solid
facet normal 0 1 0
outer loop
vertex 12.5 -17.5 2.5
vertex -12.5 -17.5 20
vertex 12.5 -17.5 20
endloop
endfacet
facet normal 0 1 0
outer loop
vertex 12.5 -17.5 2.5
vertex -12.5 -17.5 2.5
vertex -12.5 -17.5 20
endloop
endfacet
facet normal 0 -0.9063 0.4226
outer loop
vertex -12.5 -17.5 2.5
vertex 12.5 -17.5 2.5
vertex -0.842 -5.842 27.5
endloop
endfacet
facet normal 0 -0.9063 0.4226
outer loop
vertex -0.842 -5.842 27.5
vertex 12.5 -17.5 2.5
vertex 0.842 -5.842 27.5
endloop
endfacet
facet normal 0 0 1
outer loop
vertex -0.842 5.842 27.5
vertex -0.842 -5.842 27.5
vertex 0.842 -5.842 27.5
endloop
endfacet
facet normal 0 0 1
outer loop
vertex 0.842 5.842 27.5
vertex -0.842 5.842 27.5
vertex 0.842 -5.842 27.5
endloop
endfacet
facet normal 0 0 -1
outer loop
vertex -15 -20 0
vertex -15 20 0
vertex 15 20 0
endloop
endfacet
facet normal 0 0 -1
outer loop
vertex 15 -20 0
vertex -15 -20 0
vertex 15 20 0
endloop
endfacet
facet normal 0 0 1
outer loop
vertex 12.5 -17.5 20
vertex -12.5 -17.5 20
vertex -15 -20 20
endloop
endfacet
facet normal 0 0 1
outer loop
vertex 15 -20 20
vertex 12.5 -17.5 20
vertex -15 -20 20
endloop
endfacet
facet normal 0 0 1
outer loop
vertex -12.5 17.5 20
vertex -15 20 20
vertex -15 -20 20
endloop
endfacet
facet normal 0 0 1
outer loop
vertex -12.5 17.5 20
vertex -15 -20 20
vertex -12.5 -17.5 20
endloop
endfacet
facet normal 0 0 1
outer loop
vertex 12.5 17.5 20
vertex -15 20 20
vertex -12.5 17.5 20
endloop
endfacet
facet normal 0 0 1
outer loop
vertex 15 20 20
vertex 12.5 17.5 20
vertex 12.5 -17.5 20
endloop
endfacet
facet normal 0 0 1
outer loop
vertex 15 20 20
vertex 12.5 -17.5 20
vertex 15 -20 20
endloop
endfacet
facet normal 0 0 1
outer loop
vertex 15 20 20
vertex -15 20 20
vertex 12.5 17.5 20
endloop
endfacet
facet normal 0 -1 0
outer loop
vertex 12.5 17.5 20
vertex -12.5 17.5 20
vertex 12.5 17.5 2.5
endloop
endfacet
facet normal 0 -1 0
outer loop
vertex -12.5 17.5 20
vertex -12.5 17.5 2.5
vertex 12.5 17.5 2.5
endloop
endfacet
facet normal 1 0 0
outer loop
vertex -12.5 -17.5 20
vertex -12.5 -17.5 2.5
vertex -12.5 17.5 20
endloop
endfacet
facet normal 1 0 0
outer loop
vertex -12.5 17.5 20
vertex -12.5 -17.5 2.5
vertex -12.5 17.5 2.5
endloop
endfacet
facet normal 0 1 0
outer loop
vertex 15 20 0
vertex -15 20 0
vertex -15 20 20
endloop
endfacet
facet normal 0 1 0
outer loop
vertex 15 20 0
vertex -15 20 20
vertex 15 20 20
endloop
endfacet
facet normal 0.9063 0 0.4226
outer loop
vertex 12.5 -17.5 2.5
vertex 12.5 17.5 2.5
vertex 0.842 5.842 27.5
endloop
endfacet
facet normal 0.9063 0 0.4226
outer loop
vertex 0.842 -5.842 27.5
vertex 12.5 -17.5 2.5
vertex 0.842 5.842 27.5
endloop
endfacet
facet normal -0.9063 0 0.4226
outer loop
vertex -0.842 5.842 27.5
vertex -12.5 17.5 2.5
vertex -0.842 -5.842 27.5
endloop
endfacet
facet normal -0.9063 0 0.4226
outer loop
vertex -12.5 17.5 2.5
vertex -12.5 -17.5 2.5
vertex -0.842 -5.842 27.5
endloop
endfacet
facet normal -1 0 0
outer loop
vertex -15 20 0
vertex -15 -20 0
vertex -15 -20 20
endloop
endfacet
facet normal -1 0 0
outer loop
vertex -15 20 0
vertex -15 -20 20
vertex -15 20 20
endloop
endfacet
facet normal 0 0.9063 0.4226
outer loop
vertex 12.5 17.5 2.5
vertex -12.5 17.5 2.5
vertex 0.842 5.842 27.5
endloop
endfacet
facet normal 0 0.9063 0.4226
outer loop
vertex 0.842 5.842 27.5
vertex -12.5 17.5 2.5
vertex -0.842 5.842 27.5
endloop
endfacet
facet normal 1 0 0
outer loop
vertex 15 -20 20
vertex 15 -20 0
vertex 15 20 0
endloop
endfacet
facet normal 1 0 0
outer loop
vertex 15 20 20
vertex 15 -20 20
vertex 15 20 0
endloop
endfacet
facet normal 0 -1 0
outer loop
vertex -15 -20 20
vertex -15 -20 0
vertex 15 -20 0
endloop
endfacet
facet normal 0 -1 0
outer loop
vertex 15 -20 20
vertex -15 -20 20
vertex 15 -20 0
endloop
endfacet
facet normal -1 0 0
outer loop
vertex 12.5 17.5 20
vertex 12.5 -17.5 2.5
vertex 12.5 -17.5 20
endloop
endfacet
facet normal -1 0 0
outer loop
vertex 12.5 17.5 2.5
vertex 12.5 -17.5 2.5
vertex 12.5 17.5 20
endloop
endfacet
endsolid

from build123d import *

# Parameters (mm, degrees)
F0_W     = 30
F0_H     = 40
F1_DEPTH = 20
F2_T     = -2.5
F3_W     = 25
F3_H     = 35
F4_DEPTH = 25
F4_TAPER = 25


with BuildPart() as f1:
    # F0 (on Top) → F1 (new body)
    with BuildSketch(Plane.XY):
        Rectangle(F0_W, F0_H)
    extrude(amount=F1_DEPTH)

    # F2
    f2_openings = [f1.faces().sort_by_distance(p)[0] for p in [
        (0, 0, 20),
    ]]
    offset(amount=F2_T, openings=f2_openings)

    # F3 (on face) → F4 (join)
    with BuildSketch(Plane.XY.offset(2.5)):
        Rectangle(F3_W, F3_H)
    extrude(amount=F4_DEPTH, taper=F4_TAPER)


solid = f1.part
